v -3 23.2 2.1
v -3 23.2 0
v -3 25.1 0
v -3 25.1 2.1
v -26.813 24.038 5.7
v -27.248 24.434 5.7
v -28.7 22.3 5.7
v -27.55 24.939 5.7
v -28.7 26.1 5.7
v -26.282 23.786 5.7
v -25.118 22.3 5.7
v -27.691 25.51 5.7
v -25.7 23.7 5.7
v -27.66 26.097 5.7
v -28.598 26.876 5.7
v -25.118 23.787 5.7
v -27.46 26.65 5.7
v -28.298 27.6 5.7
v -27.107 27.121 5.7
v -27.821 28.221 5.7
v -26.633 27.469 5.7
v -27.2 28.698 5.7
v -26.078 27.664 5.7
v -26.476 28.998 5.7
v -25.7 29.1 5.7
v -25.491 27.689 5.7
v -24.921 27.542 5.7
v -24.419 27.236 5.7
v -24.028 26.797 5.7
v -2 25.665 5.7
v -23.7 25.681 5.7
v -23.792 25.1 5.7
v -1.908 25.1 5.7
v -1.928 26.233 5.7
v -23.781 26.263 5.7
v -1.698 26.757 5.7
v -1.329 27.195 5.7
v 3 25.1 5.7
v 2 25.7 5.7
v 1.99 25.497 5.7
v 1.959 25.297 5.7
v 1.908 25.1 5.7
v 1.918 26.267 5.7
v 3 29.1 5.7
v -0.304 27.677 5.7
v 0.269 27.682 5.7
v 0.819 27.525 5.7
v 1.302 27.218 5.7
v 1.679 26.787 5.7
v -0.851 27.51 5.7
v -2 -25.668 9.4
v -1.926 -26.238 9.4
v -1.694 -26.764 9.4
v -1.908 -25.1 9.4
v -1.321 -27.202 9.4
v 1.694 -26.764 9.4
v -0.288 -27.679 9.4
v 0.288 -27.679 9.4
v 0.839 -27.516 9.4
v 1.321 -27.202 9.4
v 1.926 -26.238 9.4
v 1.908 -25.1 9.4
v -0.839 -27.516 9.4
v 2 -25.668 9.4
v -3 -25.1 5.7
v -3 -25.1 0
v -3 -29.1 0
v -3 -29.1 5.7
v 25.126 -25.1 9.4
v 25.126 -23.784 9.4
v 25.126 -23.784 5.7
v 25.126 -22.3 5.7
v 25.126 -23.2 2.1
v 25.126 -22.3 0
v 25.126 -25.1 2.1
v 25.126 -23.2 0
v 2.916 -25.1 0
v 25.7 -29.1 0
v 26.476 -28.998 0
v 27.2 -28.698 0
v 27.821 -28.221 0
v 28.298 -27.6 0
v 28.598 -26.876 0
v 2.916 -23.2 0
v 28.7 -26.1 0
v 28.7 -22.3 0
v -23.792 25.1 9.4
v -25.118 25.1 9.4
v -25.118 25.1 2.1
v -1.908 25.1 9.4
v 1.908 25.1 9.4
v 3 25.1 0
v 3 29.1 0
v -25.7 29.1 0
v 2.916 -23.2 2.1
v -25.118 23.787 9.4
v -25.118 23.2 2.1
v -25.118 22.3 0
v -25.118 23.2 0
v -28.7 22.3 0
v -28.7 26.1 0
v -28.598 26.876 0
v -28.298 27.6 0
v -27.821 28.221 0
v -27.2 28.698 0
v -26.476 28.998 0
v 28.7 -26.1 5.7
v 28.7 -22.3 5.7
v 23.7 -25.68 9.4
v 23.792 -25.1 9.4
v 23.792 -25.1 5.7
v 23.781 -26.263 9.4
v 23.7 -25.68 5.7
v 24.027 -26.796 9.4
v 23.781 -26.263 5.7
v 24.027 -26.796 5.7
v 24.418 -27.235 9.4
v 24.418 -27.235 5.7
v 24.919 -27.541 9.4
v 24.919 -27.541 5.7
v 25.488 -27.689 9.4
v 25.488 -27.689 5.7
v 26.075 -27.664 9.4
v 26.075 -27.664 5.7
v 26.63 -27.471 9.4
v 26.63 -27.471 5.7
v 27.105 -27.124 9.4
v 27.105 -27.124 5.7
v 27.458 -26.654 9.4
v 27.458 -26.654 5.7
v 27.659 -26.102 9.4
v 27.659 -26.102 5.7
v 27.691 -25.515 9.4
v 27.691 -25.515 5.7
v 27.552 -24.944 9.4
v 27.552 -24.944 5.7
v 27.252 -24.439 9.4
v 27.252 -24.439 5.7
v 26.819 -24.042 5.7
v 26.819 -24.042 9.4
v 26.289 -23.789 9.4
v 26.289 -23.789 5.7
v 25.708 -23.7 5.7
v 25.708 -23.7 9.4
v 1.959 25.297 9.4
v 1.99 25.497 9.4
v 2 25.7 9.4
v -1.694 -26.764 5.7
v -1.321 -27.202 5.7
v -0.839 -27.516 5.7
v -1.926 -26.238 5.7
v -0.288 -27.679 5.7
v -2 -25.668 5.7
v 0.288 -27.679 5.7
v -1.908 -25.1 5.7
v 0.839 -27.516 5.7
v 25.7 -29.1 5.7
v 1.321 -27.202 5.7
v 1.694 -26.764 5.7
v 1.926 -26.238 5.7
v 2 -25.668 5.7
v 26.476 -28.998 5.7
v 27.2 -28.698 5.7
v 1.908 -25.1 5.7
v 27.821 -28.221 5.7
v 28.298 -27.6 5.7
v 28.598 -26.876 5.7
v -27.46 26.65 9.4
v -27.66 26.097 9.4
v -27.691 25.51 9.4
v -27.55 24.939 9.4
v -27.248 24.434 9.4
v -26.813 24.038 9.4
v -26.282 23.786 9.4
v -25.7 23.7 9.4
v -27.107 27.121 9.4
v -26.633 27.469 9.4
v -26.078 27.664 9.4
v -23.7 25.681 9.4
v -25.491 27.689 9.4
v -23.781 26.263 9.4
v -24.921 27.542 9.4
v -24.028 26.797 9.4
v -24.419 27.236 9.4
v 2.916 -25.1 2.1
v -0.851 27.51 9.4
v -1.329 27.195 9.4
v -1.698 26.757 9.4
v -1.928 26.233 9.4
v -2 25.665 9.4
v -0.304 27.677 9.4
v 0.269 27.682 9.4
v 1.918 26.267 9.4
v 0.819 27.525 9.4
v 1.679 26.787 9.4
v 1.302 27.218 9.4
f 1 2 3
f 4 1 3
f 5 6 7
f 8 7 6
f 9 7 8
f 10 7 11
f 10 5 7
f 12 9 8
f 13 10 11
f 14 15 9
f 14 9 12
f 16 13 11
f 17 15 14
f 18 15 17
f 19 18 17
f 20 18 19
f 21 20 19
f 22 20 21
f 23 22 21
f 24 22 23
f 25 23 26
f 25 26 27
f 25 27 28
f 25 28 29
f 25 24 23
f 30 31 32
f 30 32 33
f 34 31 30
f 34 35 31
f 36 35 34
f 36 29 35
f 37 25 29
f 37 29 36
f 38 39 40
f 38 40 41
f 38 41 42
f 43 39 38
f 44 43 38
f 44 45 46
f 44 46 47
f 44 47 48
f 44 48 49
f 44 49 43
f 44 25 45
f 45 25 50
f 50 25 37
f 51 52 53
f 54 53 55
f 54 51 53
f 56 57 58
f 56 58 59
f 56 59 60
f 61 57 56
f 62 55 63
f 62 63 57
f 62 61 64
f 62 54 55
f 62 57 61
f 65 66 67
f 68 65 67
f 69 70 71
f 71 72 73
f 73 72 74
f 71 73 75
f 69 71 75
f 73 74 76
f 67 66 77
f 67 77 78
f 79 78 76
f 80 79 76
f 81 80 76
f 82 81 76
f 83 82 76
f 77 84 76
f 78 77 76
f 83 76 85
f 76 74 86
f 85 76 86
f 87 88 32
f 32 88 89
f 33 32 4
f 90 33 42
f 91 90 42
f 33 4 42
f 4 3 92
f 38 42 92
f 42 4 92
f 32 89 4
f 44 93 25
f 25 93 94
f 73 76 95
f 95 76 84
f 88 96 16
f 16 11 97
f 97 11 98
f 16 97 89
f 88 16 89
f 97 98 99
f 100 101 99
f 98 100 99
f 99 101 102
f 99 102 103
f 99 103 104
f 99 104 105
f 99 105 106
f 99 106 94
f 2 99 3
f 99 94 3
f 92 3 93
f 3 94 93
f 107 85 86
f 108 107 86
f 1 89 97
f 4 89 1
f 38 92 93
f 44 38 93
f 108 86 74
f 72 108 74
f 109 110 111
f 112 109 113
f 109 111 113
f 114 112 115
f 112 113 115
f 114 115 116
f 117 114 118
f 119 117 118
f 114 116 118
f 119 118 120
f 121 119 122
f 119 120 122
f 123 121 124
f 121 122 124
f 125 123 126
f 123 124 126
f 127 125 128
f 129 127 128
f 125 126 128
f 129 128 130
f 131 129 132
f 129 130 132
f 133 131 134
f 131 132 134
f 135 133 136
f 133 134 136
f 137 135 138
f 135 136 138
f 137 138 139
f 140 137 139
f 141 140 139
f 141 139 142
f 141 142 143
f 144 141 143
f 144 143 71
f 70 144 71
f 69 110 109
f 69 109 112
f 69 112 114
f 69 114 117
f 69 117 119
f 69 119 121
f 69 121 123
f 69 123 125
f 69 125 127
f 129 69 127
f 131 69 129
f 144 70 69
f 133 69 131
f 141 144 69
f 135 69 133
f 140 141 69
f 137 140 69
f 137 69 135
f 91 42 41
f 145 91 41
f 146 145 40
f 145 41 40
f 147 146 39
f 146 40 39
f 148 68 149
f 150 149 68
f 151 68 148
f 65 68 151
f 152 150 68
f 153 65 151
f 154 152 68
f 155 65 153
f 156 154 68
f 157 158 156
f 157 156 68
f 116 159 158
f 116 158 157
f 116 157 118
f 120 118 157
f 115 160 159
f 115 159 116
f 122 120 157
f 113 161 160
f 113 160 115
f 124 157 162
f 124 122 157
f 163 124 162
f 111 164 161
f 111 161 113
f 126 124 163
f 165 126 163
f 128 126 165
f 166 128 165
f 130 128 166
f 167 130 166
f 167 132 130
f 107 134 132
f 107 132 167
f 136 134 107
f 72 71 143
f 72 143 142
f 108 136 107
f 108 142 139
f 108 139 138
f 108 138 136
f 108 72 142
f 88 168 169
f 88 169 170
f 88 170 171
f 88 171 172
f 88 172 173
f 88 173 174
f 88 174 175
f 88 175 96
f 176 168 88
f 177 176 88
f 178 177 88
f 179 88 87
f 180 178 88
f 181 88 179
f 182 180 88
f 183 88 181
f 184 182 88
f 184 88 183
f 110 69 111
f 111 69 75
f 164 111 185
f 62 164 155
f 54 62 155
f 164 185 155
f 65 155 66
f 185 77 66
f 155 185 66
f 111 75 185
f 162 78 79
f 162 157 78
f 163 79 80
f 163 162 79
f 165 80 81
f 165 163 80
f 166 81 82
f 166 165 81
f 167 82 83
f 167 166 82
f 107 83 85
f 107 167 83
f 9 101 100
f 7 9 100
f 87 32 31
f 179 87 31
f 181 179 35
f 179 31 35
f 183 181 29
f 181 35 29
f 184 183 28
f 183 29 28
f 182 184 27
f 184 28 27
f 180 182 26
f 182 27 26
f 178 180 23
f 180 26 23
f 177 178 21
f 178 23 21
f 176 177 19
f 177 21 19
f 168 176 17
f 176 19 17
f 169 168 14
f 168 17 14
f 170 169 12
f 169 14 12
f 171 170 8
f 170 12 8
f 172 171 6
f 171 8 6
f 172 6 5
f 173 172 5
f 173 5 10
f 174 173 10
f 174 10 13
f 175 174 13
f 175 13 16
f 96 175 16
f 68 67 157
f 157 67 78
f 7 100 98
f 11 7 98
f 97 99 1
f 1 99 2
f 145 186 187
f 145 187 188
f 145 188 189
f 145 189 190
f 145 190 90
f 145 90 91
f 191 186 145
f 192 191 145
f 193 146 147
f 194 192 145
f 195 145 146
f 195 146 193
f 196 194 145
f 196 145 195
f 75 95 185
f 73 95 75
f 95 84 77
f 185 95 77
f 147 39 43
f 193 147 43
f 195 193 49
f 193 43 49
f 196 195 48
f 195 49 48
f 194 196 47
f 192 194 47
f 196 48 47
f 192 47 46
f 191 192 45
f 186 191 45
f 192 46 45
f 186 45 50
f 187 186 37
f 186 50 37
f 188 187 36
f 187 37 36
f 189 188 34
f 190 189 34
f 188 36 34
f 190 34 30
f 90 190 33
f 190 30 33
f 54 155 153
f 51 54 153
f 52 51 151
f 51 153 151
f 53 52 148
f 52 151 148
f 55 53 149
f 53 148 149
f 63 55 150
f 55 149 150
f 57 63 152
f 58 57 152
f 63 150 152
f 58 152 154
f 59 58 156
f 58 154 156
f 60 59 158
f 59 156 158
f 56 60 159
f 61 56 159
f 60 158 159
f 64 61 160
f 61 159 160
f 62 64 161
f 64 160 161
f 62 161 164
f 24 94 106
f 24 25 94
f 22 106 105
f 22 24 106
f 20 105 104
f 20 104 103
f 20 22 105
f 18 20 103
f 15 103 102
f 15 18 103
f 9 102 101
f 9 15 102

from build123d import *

# Parameters (mm, degrees)
F1_DEPTH = 9.4
F2_DEPTH = 5.7
F3_DEPTH = 2.1
F4_R     = 3


with BuildPart() as f1:
    # F0 (on Top) → F1 (new body)
    with BuildSketch(Plane.XY):
        with BuildLine():
            ThreePointArc((23.792122, -25.1), (27.104591, -27.123771), (25.12593, -23.78416))
            Line((25.12593, -23.78416), (25.12593, -25.1))
            Line((25.12593, -25.1), (23.792122, -25.1))
        make_face()
        with BuildLine():
            ThreePointArc((-1.907878, -25.1), (0, -27.7), (1.907878, -25.1))
            Line((1.907878, -25.1), (-1.907878, -25.1))
        make_face()
        with BuildLine():
            Line((-25.118154, 25.1), (-23.792122, 25.1))
            ThreePointArc((-23.792122, 25.1), (-27.107479, 27.120916), (-25.118154, 23.786507))
            Line((-25.118154, 23.786507), (-25.118154, 25.1))
        make_face()
        with BuildLine():
            Line((-1.802776, 25.1), (1.802776, 25.1))
            ThreePointArc((1.802776, 25.1), (0, 27.6), (-1.802776, 25.1))
        make_face()
        with BuildLine():
            Line((1.802776, 25.1), (1.907878, 25.1))
            ThreePointArc((1.907878, 25.1), (1.976835, 25.396485), (2, 25.7))
            ThreePointArc((2, 25.7), (-0.303515, 27.676835), (-1.907878, 25.1))
            Line((-1.907878, 25.1), (-1.802776, 25.1))
            ThreePointArc((-1.802776, 25.1), (0, 27.6), (1.802776, 25.1))
        make_face()
    extrude(amount=F1_DEPTH)

    # F0 (on Top) → F2 (join)
    with BuildSketch(Plane.XY):
        with BuildLine():
            Line((28.7, -22.3), (25.12593, -22.3))
            Line((25.12593, -22.3), (25.12593, -23.2))
            Line((25.12593, -23.2), (25.12593, -23.78416))
            ThreePointArc((25.12593, -23.78416), (27.104591, -27.123771), (23.792122, -25.1))
            Line((23.792122, -25.1), (2.915675, -25.1))
            Line((2.915675, -25.1), (1.907878, -25.1))
            ThreePointArc((1.907878, -25.1), (0, -27.7), (-1.907878, -25.1))
            Line((-1.907878, -25.1), (-2.612185, -25.1))
            Line((-2.612185, -25.1), (-3, -25.1))
            Line((-3, -25.1), (-3, -29.1))
            Line((-3, -29.1), (28.7, -29.1))
            Line((28.7, -29.1), (28.7, -22.3))
        make_face()
        with BuildLine():
            Line((1.907878, 25.1), (3, 25.1))
            Line((3, 25.1), (3, 29.1))
            Line((3, 29.1), (-3, 29.1))
            Line((-3, 29.1), (-28.7, 29.1))
            Line((-28.7, 29.1), (-28.7, 22.3))
            Line((-28.7, 22.3), (-25.118154, 22.3))
            Line((-25.118154, 22.3), (-25.118154, 23.2))
            Line((-25.118154, 23.2), (-25.118154, 23.786507))
            ThreePointArc((-25.118154, 23.786507), (-27.107479, 27.120916), (-23.792122, 25.1))
            Line((-23.792122, 25.1), (-3, 25.1))
            Line((-3, 25.1), (-1.907878, 25.1))
            ThreePointArc((-1.907878, 25.1), (-0.303515, 27.676835), (2, 25.7))
            ThreePointArc((2, 25.7), (1.976835, 25.396485), (1.907878, 25.1))
        make_face()
    extrude(amount=F2_DEPTH)

    # F0 (on Top) → F3 (join)
    with BuildSketch(Plane.XY):
        Polygon((-3, 23.2), (-3, 25.1), (-23.792122, 25.1), (-25.118154, 25.1), (-25.118154, 23.786507), (-25.118154, 23.2), align=None)
        Polygon((25.12593, -23.78416), (25.12593, -23.2), (2.915675, -23.2), (2.915675, -25.1), (23.792122, -25.1), (25.12593, -25.1), align=None)
    extrude(amount=F3_DEPTH)

    # F4
    f4_edges = [f1.edges().sort_by_distance(p)[0] for p in [
        (28.7, -29.1, 2.85),
        (-28.7, 29.1, 2.85),
    ]]
    fillet(f4_edges, radius=F4_R)


solid = f1.part
